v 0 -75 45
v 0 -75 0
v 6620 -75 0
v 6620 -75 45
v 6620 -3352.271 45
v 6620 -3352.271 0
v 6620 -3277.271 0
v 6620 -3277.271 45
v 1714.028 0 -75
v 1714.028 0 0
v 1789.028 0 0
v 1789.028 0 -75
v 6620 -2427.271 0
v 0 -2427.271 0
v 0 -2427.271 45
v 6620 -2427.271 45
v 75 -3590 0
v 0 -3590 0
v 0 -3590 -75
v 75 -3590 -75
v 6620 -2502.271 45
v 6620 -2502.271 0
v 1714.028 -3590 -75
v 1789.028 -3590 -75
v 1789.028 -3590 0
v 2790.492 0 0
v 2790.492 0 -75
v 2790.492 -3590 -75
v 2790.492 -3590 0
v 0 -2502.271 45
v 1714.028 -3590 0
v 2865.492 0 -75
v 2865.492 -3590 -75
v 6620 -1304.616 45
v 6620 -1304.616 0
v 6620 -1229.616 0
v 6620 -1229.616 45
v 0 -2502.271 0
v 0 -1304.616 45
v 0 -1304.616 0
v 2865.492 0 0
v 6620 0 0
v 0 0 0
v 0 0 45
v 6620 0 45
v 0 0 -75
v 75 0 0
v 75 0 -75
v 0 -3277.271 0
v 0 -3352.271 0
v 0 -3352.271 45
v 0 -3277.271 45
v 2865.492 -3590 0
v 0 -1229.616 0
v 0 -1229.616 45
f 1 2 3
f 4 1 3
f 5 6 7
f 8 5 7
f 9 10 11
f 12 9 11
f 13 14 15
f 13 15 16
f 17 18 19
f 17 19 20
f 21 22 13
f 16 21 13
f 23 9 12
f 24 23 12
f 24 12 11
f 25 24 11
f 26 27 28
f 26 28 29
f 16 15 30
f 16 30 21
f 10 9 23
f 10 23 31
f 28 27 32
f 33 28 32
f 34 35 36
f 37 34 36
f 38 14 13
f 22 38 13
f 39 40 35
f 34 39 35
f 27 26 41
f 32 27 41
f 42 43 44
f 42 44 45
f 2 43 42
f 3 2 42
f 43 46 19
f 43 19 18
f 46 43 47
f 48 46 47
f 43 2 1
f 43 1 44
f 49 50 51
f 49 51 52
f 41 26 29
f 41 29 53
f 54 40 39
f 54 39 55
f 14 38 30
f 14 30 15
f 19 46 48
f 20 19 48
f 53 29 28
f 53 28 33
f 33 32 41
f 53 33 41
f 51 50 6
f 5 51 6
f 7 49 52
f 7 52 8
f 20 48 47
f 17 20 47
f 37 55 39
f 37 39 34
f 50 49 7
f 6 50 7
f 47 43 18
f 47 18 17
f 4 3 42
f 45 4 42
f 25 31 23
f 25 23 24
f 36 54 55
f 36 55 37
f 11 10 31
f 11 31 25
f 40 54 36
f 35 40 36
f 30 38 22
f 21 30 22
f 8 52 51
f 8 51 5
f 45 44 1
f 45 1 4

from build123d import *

# Parameters (mm, degrees)
F0_W     = 75
F0_H     = 75
F2_DEPTH = 3590
F1_W     = 6620
F1_H     = 75
F3_DEPTH = 45


with BuildPart() as f2:
    # F0 (on Front) → F2 (new body)
    with BuildSketch(Plane.XZ):
        with Locations((37.5, -37.500025)):
            Rectangle(F0_W, F0_H)
        with Locations((2827.991581, -37.500025)):
            Rectangle(F0_W, F0_H)
        with Locations((1751.527847, -37.500025)):
            Rectangle(F0_W, F0_H)
    extrude(amount=F2_DEPTH)


with BuildPart() as f3:
    # F1 (on Top) → F3 (new body)
    with BuildSketch(Plane.XY):
        with Locations((3310, -37.5)):
            Rectangle(F1_W, F1_H)
        with Locations((3310, -2464.771456)):
            Rectangle(F1_W, F1_H)
        with Locations((3310, -1267.116165)):
            Rectangle(F1_W, F1_H)
        with Locations((3310, -3314.770842)):
            Rectangle(F1_W, F1_H)
    extrude(amount=F3_DEPTH)


solid = Compound([f2.part, f3.part])
